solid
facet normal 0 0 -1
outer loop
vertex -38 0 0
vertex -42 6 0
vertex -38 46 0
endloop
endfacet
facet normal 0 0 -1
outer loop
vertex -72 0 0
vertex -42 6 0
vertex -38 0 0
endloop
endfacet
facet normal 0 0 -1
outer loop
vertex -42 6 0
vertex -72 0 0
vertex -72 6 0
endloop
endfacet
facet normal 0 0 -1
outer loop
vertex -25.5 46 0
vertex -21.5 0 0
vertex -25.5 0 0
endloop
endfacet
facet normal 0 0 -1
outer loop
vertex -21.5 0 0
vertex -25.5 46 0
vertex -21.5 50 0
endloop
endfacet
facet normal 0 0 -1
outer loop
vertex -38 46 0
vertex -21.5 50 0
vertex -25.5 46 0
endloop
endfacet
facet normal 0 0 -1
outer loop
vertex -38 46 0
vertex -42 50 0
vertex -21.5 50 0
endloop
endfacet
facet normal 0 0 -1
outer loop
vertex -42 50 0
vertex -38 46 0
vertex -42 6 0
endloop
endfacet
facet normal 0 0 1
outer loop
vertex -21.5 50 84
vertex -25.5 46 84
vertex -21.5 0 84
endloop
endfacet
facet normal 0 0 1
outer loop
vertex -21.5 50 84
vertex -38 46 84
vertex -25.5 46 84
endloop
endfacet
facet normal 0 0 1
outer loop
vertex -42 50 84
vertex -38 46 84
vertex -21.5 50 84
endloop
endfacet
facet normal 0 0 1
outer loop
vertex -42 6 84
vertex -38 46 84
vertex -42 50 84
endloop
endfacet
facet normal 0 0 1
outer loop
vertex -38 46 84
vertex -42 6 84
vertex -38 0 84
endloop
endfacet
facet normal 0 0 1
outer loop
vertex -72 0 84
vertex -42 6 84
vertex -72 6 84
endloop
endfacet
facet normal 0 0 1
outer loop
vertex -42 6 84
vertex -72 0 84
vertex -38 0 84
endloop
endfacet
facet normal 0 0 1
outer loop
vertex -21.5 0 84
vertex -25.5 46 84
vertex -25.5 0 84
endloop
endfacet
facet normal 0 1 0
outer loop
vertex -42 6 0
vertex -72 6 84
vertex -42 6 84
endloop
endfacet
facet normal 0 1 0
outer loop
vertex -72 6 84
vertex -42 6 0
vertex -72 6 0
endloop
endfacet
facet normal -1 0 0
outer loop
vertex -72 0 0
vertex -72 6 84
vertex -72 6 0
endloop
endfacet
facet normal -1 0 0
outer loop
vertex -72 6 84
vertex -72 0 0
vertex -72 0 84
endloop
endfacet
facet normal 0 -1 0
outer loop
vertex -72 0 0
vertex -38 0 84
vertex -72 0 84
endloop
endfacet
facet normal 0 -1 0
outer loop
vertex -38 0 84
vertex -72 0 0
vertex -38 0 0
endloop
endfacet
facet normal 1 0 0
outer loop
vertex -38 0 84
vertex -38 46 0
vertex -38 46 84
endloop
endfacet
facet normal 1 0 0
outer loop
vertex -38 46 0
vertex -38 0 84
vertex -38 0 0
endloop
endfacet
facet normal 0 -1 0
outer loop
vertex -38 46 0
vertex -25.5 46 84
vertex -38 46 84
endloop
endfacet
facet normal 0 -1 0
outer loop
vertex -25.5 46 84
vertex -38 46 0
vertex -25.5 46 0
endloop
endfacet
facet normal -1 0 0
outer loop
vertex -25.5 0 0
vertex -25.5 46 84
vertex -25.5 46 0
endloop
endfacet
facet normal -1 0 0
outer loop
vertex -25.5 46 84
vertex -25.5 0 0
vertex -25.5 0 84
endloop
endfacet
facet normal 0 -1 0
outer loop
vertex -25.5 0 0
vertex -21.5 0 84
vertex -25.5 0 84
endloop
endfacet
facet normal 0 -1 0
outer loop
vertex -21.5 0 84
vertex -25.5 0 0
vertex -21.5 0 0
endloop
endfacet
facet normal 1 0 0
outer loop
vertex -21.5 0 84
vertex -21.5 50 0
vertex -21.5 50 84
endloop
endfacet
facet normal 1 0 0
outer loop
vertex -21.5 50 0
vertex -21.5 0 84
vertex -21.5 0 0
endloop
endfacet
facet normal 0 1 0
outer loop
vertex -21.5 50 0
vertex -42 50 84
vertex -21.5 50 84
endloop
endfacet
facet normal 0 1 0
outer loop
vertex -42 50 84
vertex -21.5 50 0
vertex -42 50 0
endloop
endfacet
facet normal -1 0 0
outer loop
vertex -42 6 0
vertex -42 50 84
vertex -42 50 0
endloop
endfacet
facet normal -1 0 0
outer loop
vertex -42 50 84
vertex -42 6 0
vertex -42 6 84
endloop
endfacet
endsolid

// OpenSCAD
// --- Dimensions ---
// Overall extrusion length along X axis
length_x = 84; 

// Wall thickness of the bucket (reference)
wall_thickness = 12; 

// Vertical height of the legs
leg_height = 50; 

// Thickness of the top bridge
bridge_thickness = 4; 

// Width of the legs (Y-axis dimension)
leg_width = 4; 

// Gap between legs (16.5 - 4 = 12.5mm)
gap_width = 12.5; 

// Ledge thickness (Z-axis dimension)
ledge_thickness = 6; 

// Ledge depth (Y-axis dimension)
ledge_depth = 30; 

// PCR tube hole diameter
hole_diameter = 6.4; 

// PCR tube hole spacing (X-axis)
hole_spacing_x = 9; 

// Number of tubes
num_tubes = 8; 

// Number of tubes Y-position (offset from origin)
hole_y_pos = -15; 

// Smoothness for cylinders
fn_val = 64;

// --- Implementation ---

// The error in the previous version was caused by trying to use 
// linear_extrude on a 3D object (the profile_shape module).
// linear_extrude only works on 2D shapes.
// I will define the profile as a 2D polygon instead.

module profile_2d() {
    // We define the profile in the YZ plane
    // The X dimension is handled by linear_extrude
    union() {
        // Inner Leg: y=0 to 4, z=0 to 50
        polygon(points=[[0,0], [4,0], [4,50], [0,50]]);
        
        // Outer Leg: y=16.5 to 20.5, z=0 to 50
        polygon(points=[[16.5,0], [20.5,0], [20.5,50], [16.5,50]]);
        
        // Top Bridge: z=46 to 50, y=0 to 20.5
        polygon(points=[[0,46], [20.5,46], [20.5,50], [0,50]]);
        
        // Ledge: z=0 to 6, y=-30 to 0
        polygon(points=[[-30,0], [0,0], [0,6], [-30,6]]);
    }
}

// Final Assembly
difference() {
    // 1. Create the main body by extruding the 2D profile along X
    // Centered on X=0 means X goes from -42 to 42
    translate([-length_x/2, 0, 0])
        linear_extrude(height = length_x)
            profile_2d();

    // 2. Subtract the tube holes
    // Holes are 6.4mm diameter, vertical (Z-axis)
    // They are centered on X, at y = -15
    for (i = [0 : num_tubes - 1]) {
        // Calculate X offset to center the 8 holes
        // Total span = (7 * 9) = 63. 
        // Center of span is at (63/2) = 31.5.
        // We want the group centered on X=0.
        x_offset = (i * hole_spacing_x) - ((num_tubes - 1) * hole_spacing_x / 2);
        
        // We translate the cylinder to the hole position.
        // We extend the cylinder in Z to ensure it cuts through the ledge completely.
        translate([x_offset, hole_y_pos, -1]) 
            cylinder(h = ledge_thickness + 2, d = hole_diameter, $fn = fn_val);
    }
}
